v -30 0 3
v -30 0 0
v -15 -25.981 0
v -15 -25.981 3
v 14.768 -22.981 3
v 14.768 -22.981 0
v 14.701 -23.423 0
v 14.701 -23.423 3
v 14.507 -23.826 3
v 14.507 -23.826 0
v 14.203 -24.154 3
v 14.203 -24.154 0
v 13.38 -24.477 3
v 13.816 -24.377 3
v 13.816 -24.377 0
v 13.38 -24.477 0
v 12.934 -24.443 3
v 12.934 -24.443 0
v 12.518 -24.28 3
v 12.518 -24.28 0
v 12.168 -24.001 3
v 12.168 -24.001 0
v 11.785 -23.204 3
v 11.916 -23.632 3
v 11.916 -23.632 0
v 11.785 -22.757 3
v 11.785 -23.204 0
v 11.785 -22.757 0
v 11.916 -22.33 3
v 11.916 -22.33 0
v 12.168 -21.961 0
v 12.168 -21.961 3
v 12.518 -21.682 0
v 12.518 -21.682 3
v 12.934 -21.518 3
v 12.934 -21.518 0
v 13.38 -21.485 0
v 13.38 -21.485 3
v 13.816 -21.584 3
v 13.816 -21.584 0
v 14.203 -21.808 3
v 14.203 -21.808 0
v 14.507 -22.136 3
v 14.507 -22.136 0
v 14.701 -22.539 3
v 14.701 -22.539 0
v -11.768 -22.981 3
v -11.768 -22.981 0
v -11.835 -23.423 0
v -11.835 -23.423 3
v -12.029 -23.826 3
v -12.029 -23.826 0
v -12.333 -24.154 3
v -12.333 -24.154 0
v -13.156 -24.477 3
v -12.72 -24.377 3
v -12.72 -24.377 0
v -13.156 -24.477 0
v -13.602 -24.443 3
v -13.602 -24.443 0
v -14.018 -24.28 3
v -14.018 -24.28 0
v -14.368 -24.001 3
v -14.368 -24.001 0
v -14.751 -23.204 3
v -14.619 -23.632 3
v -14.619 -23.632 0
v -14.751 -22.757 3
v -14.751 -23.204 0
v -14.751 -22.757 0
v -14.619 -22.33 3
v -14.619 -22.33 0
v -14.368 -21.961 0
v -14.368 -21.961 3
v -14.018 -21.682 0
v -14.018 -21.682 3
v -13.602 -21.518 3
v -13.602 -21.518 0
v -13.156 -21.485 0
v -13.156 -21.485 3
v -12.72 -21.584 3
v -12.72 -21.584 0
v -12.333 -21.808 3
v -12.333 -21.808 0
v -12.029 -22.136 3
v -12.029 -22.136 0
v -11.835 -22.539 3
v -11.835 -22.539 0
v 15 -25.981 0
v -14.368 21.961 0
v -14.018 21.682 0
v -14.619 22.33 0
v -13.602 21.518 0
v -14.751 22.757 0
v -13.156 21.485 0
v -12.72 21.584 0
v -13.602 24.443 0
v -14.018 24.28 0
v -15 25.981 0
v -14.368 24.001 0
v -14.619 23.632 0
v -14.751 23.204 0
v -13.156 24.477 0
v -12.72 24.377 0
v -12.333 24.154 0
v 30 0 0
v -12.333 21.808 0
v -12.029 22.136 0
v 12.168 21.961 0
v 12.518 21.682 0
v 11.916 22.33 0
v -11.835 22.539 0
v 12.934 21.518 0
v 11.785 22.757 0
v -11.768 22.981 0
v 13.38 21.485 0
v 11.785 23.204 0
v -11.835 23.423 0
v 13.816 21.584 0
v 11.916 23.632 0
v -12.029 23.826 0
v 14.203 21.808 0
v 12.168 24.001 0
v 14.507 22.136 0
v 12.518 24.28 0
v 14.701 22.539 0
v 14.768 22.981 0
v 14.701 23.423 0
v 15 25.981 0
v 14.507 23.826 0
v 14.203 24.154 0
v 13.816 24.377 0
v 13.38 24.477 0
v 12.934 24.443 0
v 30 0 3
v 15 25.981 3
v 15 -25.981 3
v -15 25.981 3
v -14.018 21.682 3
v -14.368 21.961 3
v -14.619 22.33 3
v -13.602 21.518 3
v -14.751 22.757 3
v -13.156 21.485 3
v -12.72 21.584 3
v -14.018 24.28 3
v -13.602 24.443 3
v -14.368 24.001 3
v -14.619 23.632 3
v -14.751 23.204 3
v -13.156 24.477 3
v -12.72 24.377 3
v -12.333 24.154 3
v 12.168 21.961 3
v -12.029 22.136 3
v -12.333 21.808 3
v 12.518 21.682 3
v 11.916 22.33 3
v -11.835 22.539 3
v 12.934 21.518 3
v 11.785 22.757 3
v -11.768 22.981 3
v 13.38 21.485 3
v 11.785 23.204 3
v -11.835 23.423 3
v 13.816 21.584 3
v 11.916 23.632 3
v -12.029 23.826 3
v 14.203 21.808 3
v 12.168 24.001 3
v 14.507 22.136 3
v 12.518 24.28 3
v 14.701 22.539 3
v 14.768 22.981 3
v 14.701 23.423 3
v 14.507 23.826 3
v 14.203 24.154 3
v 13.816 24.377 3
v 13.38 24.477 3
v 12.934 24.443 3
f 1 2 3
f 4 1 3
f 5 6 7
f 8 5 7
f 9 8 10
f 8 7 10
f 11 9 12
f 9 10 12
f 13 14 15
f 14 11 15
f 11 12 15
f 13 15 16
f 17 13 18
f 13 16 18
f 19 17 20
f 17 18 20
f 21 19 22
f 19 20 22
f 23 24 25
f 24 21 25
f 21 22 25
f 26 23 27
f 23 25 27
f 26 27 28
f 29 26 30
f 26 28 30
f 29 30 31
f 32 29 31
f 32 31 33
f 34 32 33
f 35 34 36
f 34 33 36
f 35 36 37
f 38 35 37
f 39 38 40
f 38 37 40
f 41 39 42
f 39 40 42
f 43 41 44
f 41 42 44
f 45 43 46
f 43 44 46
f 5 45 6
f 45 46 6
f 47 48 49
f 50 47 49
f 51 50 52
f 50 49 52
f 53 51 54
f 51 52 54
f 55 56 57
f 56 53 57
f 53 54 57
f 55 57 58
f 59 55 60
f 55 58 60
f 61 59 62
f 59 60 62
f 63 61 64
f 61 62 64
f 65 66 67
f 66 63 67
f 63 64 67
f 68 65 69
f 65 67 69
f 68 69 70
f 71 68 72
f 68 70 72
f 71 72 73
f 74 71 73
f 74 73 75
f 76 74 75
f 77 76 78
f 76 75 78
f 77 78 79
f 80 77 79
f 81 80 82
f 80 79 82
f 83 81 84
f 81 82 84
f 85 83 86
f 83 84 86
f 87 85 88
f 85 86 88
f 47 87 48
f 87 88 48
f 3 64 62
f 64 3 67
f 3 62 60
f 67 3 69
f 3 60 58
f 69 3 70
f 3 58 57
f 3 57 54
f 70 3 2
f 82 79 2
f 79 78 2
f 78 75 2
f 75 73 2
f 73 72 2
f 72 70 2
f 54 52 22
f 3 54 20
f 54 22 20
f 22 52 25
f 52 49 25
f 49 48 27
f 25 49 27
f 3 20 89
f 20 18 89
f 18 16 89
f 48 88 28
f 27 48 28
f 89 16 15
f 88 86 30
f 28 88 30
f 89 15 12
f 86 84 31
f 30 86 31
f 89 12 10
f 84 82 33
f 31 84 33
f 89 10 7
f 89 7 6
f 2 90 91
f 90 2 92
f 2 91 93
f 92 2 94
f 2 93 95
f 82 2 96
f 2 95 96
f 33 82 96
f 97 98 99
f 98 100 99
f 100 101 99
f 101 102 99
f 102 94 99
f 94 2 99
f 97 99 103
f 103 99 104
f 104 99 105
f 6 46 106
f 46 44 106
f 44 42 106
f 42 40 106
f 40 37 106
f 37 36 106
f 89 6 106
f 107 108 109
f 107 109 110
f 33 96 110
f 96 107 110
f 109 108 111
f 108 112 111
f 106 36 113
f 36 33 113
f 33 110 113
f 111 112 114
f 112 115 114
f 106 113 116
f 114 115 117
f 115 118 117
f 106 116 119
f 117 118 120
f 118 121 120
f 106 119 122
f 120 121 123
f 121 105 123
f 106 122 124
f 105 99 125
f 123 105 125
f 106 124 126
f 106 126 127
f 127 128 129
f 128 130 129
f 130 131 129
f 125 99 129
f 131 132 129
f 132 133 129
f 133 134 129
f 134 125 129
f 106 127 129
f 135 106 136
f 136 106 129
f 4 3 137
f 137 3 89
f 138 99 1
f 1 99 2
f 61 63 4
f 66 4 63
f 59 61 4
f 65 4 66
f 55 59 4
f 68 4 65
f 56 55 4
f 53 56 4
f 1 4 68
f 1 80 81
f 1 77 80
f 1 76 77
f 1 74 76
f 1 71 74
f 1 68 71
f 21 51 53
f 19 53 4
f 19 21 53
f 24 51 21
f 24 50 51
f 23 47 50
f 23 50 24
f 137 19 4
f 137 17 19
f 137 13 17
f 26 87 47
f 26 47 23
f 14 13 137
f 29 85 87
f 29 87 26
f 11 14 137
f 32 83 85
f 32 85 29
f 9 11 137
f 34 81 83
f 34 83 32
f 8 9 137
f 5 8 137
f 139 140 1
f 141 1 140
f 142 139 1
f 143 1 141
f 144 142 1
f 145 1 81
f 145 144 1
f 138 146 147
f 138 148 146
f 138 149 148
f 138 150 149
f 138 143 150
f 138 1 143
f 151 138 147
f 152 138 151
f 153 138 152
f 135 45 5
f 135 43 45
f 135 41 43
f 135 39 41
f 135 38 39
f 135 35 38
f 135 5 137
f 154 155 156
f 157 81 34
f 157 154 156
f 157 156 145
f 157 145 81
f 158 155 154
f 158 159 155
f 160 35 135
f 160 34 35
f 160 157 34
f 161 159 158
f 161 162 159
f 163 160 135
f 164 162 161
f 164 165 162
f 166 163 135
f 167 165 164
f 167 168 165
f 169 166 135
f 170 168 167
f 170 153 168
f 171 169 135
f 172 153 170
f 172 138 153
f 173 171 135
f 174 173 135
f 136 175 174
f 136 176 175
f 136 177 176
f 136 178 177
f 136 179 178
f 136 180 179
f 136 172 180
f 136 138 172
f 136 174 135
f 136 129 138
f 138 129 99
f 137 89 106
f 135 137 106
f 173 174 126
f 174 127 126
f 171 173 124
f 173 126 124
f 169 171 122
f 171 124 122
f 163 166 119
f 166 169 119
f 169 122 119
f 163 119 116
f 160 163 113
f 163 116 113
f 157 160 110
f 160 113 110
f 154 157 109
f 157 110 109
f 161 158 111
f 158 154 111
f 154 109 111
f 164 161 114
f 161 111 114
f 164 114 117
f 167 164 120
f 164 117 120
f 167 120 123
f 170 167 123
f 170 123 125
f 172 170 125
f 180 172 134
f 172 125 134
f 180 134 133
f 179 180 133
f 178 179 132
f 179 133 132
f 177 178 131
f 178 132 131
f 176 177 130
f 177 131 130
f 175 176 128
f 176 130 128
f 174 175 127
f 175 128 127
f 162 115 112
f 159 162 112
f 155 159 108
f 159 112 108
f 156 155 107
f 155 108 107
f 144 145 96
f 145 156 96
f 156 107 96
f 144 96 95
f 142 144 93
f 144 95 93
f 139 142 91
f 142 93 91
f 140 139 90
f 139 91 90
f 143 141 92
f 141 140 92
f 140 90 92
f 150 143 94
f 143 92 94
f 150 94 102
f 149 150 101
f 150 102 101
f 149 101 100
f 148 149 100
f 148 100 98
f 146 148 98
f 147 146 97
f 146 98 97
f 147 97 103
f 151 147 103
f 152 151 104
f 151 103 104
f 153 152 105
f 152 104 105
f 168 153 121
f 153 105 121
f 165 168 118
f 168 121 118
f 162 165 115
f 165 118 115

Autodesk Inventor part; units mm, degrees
ref_plane "YZ Plane" through (0, 0, 0) normal (1, 0, 0) x (0, 1, 0)
ref_plane "XZ Plane" through (0, 0, 0) normal (0, 1, 0) x (-1, 0, 0)
ref_plane "XY Plane" through (0, 0, 0) normal (0, 0, 1) x (1, 0, 0)
sketch "Sketch1" plane through (0, 0, 0) normal (0, 0, 1) x (1, 0, 0)
  line L0 (-29.9999, 0.0001) -> (-15, -25.9807)
  line L1 (15, -25.9808) -> (30, 0)
  line L2 (-15, -25.9807) -> (15, -25.9808)
  line L3 (30, 0) -> (15, 25.9808)
  line L4 (15, 25.9808) -> (-15, 25.9808)
  line L5 (-15, 25.9808) -> (-30, 0)
  line L6 (0, 25.9808) -> (0, -25.9808) construction
  line L7 (-30, 0) -> (30, 0) construction
  line L8 (-24.8039, 3) -> (-13.268, 22.9808) construction
  line L9 (-13.268, 22.9808) -> (13.2679, 22.9808) construction
  line L10 (13.2679, 22.9808) -> (24.8038, 3) construction
  line L11 (24.8038, 3) -> (-24.8039, 3) construction
  circle A0 centre (-13.268, 22.9808) radius 1.5
  circle A1 centre (13.2679, 22.9808) radius 1.5
  circle A2 centre (-24.8039, 0) radius 1.5 construction
  line L12 (-24.8039, 3) -> (-26.5359, 0) construction
  circle A3 centre (24.8039, 0.0001) radius 1.5 construction
  circle A4 centre (-13.268, -22.9808) radius 1.5
  circle A5 centre (13.2679, -22.9808) radius 1.5
  point P0 (0, 0)
  point P1 (0, 0)
  point P2 (-30, 0.0001)
  dimension "d1" = 30
  dimension "d6" = 120
  dimension "d7" = 120
  dimension "d8" = 120
  dimension "d9" = 120
  dimension "d10" = 120
  dimension "d13" = 3
  dimension "d14" = 3
  dimension "d15" = 3
extrude "Extrusion1" add sketch "Sketch1" along normal blind 3
equation "\"d7\" = d6"
equation "\"d8\" = d6"
equation "\"d9\" = d6"
equation "\"d10\" = d6"
properties part number "ArmControlBoard"
